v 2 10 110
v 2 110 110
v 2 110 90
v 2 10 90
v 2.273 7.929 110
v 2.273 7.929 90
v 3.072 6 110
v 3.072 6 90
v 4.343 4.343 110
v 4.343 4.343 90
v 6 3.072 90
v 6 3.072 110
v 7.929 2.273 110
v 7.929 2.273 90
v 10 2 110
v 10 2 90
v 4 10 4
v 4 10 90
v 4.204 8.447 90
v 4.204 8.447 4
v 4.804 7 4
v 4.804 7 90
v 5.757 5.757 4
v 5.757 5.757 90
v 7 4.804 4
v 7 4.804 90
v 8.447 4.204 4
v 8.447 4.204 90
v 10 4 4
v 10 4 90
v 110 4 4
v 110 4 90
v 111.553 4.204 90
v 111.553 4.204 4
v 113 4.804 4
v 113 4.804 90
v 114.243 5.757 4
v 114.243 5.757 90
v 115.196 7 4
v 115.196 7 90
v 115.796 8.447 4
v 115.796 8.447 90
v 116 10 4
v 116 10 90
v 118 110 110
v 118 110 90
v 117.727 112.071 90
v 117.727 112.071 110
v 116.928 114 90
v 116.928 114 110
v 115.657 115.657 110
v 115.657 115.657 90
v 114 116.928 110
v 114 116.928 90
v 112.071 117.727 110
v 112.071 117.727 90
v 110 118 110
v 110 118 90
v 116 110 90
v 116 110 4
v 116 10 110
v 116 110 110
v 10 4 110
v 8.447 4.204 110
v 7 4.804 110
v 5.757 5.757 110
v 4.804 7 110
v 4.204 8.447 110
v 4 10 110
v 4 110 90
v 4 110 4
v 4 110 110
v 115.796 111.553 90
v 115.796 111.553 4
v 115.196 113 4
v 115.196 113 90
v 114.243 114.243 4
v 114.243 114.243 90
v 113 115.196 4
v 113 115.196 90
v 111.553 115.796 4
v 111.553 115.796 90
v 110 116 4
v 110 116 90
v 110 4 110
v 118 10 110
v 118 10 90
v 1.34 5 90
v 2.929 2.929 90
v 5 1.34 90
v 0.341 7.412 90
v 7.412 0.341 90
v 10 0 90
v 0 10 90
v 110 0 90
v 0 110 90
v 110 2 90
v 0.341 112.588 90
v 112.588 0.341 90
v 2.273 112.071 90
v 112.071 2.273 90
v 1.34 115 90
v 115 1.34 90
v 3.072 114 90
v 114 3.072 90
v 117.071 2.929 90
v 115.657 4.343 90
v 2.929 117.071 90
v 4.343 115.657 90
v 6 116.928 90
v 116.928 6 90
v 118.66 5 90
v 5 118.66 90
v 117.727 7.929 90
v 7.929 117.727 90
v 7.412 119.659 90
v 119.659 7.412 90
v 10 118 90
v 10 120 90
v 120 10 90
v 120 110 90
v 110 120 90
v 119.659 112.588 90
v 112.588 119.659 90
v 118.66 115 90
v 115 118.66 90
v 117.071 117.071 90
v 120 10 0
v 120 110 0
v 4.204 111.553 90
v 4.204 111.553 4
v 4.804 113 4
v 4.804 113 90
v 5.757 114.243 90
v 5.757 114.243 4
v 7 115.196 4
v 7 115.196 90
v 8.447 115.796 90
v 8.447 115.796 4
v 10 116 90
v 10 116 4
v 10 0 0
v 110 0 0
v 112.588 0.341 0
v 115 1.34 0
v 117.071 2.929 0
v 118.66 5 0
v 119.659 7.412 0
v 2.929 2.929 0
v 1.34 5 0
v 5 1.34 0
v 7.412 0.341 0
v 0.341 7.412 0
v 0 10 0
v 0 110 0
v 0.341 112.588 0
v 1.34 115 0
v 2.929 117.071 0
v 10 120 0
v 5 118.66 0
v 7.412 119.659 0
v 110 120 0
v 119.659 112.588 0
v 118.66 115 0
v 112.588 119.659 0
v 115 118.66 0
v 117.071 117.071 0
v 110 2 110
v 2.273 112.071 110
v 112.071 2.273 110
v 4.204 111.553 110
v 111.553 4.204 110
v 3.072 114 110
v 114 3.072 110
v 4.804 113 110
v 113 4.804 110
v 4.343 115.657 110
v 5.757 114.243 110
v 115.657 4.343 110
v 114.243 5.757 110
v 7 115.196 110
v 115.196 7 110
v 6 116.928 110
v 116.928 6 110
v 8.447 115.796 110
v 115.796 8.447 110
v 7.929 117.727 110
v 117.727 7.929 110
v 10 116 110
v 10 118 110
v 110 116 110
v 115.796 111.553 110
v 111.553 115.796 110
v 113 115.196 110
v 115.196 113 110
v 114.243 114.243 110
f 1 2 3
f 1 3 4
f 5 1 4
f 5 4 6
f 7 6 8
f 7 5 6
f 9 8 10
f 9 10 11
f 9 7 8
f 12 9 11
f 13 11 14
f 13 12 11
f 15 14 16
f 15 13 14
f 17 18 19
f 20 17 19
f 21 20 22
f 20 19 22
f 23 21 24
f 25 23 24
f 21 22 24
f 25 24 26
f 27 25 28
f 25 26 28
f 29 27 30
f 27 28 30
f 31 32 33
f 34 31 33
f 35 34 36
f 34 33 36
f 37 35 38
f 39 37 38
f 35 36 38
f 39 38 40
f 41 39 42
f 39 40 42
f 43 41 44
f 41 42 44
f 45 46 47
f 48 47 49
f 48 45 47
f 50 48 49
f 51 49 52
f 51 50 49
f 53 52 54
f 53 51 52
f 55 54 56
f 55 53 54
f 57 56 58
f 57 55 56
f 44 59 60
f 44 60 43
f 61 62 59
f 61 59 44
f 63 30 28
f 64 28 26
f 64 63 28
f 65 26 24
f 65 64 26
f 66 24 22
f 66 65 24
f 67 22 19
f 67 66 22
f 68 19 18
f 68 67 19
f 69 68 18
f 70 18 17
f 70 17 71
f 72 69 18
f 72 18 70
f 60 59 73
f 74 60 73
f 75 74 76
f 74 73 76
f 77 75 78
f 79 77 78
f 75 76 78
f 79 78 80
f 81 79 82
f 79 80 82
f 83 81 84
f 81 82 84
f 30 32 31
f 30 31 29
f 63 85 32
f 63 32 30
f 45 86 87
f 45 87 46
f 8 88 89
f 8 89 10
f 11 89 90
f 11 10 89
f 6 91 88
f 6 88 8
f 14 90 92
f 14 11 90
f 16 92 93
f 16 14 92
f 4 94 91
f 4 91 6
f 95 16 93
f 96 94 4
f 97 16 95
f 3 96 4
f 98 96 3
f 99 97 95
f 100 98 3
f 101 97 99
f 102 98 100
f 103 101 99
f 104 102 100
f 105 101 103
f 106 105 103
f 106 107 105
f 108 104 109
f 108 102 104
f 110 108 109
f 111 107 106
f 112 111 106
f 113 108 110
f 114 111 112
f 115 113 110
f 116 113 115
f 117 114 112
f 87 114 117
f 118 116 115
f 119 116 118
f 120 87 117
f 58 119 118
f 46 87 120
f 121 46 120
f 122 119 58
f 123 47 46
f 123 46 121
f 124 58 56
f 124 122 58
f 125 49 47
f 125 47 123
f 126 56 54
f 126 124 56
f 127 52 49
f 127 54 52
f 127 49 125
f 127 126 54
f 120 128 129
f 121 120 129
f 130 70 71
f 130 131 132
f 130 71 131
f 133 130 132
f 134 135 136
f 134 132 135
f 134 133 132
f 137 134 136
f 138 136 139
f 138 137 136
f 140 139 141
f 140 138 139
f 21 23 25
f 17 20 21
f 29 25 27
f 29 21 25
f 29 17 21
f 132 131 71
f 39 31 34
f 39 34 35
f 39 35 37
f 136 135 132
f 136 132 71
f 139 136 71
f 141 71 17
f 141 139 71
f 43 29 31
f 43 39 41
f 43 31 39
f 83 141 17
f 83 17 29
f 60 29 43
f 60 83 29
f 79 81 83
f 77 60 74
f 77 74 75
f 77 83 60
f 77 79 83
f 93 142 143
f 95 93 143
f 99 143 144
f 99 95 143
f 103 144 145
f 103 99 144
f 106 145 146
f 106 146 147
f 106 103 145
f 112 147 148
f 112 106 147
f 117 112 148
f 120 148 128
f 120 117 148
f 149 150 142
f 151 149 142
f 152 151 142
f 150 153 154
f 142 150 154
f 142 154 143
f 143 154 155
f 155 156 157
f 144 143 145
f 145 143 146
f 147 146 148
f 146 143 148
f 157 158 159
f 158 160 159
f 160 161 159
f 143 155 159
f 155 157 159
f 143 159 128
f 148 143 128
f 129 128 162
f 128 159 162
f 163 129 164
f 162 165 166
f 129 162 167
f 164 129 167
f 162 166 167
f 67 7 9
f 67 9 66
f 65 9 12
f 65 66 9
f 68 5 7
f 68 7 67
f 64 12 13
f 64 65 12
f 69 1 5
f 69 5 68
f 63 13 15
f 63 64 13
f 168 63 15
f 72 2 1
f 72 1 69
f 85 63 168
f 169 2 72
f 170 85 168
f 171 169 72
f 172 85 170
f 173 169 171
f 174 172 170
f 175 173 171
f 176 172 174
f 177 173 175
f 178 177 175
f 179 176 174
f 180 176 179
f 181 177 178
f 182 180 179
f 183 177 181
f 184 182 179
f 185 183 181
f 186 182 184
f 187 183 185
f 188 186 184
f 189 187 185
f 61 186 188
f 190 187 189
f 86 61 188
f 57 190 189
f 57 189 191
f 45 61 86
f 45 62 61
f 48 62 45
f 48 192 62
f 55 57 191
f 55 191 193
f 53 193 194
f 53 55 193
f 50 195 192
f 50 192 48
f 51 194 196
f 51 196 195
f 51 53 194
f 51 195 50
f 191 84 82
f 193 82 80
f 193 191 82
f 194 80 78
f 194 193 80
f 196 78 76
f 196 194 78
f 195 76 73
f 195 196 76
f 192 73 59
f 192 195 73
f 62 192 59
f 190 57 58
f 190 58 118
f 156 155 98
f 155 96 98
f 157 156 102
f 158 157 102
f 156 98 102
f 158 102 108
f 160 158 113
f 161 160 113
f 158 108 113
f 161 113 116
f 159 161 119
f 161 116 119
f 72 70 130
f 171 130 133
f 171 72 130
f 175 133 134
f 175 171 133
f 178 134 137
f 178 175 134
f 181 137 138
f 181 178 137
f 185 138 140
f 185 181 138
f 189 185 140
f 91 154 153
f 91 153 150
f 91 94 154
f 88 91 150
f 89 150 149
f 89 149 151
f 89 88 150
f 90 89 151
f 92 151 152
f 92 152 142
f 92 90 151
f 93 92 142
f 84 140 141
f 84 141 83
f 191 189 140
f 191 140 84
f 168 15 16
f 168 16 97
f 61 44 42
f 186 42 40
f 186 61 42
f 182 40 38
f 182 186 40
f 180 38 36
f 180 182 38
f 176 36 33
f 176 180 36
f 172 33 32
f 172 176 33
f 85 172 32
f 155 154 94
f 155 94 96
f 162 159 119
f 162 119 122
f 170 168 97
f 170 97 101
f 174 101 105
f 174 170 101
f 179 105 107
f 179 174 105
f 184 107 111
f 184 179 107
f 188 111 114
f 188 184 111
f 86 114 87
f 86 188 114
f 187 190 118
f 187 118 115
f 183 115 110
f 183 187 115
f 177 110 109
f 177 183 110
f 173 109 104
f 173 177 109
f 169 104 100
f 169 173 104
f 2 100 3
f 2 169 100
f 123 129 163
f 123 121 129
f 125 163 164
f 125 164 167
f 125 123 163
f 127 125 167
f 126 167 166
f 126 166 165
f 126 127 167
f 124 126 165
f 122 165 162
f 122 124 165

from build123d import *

# Parameters (mm, degrees)
SKETCH1_W           = 120
SKETCH1_H           = 120
BOSS_EXTRUDE1_DEPTH = 90
FILLET1_R           = 10
SHELL1_T            = -4
BOSS_EXTRUDE3_START = 20
BOSS_EXTRUDE3_DEPTH = 20


with BuildPart() as part:
    # Sketch1 → Boss-Extrude1 (new body)
    with BuildSketch(Plane.XY):
        with Locations((60, 60)):
            Rectangle(SKETCH1_W, SKETCH1_H)
    extrude(amount=BOSS_EXTRUDE1_DEPTH)

    # Fillet1
    fillet1_edges = [part.edges().sort_by_distance(p)[0] for p in [
        (0, 0, 45),
        (120, 0, 45),
        (120, 120, 45),
        (0, 120, 45),
    ]]
    fillet(fillet1_edges, radius=FILLET1_R)

    # Shell1
    shell1_openings = [part.faces().sort_by_distance(p)[0] for p in [
        (60, 60, 90),
    ]]
    offset(amount=SHELL1_T, openings=shell1_openings, kind=Kind.INTERSECTION)

    # Sketch2 → Boss-Extrude3 (add)
    with BuildSketch(Plane.XY.offset(90).offset(BOSS_EXTRUDE3_START)):
        with BuildLine():
            ThreePointArc((10, 118), (4.343145751, 115.656854249), (2, 110))
            Line((2, 110), (2, 10))
            ThreePointArc((2, 10), (4.343145751, 4.343145751), (10, 2))
            Line((10, 2), (110, 2))
            ThreePointArc((110, 2), (115.656854249, 4.343145751), (118, 10))
            Line((118, 10), (118, 110))
            ThreePointArc((118, 110), (115.656854249, 115.656854249), (110, 118))
            Line((110, 118), (10, 118))
        make_face()
        with BuildLine():
            ThreePointArc((116, 10), (114.242640687, 5.757359313), (110, 4))
            Line((110, 4), (10, 4))
            ThreePointArc((10, 4), (5.757359313, 5.757359313), (4, 10))
            Line((4, 10), (4, 110))
            ThreePointArc((4, 110), (5.757359313, 114.242640687), (10, 116))
            Line((10, 116), (110, 116))
            ThreePointArc((110, 116), (114.242640687, 114.242640687), (116, 110))
            Line((116, 110), (116, 10))
        make_face(mode=Mode.SUBTRACT)
    extrude(amount=-BOSS_EXTRUDE3_DEPTH)


solid = part.part
